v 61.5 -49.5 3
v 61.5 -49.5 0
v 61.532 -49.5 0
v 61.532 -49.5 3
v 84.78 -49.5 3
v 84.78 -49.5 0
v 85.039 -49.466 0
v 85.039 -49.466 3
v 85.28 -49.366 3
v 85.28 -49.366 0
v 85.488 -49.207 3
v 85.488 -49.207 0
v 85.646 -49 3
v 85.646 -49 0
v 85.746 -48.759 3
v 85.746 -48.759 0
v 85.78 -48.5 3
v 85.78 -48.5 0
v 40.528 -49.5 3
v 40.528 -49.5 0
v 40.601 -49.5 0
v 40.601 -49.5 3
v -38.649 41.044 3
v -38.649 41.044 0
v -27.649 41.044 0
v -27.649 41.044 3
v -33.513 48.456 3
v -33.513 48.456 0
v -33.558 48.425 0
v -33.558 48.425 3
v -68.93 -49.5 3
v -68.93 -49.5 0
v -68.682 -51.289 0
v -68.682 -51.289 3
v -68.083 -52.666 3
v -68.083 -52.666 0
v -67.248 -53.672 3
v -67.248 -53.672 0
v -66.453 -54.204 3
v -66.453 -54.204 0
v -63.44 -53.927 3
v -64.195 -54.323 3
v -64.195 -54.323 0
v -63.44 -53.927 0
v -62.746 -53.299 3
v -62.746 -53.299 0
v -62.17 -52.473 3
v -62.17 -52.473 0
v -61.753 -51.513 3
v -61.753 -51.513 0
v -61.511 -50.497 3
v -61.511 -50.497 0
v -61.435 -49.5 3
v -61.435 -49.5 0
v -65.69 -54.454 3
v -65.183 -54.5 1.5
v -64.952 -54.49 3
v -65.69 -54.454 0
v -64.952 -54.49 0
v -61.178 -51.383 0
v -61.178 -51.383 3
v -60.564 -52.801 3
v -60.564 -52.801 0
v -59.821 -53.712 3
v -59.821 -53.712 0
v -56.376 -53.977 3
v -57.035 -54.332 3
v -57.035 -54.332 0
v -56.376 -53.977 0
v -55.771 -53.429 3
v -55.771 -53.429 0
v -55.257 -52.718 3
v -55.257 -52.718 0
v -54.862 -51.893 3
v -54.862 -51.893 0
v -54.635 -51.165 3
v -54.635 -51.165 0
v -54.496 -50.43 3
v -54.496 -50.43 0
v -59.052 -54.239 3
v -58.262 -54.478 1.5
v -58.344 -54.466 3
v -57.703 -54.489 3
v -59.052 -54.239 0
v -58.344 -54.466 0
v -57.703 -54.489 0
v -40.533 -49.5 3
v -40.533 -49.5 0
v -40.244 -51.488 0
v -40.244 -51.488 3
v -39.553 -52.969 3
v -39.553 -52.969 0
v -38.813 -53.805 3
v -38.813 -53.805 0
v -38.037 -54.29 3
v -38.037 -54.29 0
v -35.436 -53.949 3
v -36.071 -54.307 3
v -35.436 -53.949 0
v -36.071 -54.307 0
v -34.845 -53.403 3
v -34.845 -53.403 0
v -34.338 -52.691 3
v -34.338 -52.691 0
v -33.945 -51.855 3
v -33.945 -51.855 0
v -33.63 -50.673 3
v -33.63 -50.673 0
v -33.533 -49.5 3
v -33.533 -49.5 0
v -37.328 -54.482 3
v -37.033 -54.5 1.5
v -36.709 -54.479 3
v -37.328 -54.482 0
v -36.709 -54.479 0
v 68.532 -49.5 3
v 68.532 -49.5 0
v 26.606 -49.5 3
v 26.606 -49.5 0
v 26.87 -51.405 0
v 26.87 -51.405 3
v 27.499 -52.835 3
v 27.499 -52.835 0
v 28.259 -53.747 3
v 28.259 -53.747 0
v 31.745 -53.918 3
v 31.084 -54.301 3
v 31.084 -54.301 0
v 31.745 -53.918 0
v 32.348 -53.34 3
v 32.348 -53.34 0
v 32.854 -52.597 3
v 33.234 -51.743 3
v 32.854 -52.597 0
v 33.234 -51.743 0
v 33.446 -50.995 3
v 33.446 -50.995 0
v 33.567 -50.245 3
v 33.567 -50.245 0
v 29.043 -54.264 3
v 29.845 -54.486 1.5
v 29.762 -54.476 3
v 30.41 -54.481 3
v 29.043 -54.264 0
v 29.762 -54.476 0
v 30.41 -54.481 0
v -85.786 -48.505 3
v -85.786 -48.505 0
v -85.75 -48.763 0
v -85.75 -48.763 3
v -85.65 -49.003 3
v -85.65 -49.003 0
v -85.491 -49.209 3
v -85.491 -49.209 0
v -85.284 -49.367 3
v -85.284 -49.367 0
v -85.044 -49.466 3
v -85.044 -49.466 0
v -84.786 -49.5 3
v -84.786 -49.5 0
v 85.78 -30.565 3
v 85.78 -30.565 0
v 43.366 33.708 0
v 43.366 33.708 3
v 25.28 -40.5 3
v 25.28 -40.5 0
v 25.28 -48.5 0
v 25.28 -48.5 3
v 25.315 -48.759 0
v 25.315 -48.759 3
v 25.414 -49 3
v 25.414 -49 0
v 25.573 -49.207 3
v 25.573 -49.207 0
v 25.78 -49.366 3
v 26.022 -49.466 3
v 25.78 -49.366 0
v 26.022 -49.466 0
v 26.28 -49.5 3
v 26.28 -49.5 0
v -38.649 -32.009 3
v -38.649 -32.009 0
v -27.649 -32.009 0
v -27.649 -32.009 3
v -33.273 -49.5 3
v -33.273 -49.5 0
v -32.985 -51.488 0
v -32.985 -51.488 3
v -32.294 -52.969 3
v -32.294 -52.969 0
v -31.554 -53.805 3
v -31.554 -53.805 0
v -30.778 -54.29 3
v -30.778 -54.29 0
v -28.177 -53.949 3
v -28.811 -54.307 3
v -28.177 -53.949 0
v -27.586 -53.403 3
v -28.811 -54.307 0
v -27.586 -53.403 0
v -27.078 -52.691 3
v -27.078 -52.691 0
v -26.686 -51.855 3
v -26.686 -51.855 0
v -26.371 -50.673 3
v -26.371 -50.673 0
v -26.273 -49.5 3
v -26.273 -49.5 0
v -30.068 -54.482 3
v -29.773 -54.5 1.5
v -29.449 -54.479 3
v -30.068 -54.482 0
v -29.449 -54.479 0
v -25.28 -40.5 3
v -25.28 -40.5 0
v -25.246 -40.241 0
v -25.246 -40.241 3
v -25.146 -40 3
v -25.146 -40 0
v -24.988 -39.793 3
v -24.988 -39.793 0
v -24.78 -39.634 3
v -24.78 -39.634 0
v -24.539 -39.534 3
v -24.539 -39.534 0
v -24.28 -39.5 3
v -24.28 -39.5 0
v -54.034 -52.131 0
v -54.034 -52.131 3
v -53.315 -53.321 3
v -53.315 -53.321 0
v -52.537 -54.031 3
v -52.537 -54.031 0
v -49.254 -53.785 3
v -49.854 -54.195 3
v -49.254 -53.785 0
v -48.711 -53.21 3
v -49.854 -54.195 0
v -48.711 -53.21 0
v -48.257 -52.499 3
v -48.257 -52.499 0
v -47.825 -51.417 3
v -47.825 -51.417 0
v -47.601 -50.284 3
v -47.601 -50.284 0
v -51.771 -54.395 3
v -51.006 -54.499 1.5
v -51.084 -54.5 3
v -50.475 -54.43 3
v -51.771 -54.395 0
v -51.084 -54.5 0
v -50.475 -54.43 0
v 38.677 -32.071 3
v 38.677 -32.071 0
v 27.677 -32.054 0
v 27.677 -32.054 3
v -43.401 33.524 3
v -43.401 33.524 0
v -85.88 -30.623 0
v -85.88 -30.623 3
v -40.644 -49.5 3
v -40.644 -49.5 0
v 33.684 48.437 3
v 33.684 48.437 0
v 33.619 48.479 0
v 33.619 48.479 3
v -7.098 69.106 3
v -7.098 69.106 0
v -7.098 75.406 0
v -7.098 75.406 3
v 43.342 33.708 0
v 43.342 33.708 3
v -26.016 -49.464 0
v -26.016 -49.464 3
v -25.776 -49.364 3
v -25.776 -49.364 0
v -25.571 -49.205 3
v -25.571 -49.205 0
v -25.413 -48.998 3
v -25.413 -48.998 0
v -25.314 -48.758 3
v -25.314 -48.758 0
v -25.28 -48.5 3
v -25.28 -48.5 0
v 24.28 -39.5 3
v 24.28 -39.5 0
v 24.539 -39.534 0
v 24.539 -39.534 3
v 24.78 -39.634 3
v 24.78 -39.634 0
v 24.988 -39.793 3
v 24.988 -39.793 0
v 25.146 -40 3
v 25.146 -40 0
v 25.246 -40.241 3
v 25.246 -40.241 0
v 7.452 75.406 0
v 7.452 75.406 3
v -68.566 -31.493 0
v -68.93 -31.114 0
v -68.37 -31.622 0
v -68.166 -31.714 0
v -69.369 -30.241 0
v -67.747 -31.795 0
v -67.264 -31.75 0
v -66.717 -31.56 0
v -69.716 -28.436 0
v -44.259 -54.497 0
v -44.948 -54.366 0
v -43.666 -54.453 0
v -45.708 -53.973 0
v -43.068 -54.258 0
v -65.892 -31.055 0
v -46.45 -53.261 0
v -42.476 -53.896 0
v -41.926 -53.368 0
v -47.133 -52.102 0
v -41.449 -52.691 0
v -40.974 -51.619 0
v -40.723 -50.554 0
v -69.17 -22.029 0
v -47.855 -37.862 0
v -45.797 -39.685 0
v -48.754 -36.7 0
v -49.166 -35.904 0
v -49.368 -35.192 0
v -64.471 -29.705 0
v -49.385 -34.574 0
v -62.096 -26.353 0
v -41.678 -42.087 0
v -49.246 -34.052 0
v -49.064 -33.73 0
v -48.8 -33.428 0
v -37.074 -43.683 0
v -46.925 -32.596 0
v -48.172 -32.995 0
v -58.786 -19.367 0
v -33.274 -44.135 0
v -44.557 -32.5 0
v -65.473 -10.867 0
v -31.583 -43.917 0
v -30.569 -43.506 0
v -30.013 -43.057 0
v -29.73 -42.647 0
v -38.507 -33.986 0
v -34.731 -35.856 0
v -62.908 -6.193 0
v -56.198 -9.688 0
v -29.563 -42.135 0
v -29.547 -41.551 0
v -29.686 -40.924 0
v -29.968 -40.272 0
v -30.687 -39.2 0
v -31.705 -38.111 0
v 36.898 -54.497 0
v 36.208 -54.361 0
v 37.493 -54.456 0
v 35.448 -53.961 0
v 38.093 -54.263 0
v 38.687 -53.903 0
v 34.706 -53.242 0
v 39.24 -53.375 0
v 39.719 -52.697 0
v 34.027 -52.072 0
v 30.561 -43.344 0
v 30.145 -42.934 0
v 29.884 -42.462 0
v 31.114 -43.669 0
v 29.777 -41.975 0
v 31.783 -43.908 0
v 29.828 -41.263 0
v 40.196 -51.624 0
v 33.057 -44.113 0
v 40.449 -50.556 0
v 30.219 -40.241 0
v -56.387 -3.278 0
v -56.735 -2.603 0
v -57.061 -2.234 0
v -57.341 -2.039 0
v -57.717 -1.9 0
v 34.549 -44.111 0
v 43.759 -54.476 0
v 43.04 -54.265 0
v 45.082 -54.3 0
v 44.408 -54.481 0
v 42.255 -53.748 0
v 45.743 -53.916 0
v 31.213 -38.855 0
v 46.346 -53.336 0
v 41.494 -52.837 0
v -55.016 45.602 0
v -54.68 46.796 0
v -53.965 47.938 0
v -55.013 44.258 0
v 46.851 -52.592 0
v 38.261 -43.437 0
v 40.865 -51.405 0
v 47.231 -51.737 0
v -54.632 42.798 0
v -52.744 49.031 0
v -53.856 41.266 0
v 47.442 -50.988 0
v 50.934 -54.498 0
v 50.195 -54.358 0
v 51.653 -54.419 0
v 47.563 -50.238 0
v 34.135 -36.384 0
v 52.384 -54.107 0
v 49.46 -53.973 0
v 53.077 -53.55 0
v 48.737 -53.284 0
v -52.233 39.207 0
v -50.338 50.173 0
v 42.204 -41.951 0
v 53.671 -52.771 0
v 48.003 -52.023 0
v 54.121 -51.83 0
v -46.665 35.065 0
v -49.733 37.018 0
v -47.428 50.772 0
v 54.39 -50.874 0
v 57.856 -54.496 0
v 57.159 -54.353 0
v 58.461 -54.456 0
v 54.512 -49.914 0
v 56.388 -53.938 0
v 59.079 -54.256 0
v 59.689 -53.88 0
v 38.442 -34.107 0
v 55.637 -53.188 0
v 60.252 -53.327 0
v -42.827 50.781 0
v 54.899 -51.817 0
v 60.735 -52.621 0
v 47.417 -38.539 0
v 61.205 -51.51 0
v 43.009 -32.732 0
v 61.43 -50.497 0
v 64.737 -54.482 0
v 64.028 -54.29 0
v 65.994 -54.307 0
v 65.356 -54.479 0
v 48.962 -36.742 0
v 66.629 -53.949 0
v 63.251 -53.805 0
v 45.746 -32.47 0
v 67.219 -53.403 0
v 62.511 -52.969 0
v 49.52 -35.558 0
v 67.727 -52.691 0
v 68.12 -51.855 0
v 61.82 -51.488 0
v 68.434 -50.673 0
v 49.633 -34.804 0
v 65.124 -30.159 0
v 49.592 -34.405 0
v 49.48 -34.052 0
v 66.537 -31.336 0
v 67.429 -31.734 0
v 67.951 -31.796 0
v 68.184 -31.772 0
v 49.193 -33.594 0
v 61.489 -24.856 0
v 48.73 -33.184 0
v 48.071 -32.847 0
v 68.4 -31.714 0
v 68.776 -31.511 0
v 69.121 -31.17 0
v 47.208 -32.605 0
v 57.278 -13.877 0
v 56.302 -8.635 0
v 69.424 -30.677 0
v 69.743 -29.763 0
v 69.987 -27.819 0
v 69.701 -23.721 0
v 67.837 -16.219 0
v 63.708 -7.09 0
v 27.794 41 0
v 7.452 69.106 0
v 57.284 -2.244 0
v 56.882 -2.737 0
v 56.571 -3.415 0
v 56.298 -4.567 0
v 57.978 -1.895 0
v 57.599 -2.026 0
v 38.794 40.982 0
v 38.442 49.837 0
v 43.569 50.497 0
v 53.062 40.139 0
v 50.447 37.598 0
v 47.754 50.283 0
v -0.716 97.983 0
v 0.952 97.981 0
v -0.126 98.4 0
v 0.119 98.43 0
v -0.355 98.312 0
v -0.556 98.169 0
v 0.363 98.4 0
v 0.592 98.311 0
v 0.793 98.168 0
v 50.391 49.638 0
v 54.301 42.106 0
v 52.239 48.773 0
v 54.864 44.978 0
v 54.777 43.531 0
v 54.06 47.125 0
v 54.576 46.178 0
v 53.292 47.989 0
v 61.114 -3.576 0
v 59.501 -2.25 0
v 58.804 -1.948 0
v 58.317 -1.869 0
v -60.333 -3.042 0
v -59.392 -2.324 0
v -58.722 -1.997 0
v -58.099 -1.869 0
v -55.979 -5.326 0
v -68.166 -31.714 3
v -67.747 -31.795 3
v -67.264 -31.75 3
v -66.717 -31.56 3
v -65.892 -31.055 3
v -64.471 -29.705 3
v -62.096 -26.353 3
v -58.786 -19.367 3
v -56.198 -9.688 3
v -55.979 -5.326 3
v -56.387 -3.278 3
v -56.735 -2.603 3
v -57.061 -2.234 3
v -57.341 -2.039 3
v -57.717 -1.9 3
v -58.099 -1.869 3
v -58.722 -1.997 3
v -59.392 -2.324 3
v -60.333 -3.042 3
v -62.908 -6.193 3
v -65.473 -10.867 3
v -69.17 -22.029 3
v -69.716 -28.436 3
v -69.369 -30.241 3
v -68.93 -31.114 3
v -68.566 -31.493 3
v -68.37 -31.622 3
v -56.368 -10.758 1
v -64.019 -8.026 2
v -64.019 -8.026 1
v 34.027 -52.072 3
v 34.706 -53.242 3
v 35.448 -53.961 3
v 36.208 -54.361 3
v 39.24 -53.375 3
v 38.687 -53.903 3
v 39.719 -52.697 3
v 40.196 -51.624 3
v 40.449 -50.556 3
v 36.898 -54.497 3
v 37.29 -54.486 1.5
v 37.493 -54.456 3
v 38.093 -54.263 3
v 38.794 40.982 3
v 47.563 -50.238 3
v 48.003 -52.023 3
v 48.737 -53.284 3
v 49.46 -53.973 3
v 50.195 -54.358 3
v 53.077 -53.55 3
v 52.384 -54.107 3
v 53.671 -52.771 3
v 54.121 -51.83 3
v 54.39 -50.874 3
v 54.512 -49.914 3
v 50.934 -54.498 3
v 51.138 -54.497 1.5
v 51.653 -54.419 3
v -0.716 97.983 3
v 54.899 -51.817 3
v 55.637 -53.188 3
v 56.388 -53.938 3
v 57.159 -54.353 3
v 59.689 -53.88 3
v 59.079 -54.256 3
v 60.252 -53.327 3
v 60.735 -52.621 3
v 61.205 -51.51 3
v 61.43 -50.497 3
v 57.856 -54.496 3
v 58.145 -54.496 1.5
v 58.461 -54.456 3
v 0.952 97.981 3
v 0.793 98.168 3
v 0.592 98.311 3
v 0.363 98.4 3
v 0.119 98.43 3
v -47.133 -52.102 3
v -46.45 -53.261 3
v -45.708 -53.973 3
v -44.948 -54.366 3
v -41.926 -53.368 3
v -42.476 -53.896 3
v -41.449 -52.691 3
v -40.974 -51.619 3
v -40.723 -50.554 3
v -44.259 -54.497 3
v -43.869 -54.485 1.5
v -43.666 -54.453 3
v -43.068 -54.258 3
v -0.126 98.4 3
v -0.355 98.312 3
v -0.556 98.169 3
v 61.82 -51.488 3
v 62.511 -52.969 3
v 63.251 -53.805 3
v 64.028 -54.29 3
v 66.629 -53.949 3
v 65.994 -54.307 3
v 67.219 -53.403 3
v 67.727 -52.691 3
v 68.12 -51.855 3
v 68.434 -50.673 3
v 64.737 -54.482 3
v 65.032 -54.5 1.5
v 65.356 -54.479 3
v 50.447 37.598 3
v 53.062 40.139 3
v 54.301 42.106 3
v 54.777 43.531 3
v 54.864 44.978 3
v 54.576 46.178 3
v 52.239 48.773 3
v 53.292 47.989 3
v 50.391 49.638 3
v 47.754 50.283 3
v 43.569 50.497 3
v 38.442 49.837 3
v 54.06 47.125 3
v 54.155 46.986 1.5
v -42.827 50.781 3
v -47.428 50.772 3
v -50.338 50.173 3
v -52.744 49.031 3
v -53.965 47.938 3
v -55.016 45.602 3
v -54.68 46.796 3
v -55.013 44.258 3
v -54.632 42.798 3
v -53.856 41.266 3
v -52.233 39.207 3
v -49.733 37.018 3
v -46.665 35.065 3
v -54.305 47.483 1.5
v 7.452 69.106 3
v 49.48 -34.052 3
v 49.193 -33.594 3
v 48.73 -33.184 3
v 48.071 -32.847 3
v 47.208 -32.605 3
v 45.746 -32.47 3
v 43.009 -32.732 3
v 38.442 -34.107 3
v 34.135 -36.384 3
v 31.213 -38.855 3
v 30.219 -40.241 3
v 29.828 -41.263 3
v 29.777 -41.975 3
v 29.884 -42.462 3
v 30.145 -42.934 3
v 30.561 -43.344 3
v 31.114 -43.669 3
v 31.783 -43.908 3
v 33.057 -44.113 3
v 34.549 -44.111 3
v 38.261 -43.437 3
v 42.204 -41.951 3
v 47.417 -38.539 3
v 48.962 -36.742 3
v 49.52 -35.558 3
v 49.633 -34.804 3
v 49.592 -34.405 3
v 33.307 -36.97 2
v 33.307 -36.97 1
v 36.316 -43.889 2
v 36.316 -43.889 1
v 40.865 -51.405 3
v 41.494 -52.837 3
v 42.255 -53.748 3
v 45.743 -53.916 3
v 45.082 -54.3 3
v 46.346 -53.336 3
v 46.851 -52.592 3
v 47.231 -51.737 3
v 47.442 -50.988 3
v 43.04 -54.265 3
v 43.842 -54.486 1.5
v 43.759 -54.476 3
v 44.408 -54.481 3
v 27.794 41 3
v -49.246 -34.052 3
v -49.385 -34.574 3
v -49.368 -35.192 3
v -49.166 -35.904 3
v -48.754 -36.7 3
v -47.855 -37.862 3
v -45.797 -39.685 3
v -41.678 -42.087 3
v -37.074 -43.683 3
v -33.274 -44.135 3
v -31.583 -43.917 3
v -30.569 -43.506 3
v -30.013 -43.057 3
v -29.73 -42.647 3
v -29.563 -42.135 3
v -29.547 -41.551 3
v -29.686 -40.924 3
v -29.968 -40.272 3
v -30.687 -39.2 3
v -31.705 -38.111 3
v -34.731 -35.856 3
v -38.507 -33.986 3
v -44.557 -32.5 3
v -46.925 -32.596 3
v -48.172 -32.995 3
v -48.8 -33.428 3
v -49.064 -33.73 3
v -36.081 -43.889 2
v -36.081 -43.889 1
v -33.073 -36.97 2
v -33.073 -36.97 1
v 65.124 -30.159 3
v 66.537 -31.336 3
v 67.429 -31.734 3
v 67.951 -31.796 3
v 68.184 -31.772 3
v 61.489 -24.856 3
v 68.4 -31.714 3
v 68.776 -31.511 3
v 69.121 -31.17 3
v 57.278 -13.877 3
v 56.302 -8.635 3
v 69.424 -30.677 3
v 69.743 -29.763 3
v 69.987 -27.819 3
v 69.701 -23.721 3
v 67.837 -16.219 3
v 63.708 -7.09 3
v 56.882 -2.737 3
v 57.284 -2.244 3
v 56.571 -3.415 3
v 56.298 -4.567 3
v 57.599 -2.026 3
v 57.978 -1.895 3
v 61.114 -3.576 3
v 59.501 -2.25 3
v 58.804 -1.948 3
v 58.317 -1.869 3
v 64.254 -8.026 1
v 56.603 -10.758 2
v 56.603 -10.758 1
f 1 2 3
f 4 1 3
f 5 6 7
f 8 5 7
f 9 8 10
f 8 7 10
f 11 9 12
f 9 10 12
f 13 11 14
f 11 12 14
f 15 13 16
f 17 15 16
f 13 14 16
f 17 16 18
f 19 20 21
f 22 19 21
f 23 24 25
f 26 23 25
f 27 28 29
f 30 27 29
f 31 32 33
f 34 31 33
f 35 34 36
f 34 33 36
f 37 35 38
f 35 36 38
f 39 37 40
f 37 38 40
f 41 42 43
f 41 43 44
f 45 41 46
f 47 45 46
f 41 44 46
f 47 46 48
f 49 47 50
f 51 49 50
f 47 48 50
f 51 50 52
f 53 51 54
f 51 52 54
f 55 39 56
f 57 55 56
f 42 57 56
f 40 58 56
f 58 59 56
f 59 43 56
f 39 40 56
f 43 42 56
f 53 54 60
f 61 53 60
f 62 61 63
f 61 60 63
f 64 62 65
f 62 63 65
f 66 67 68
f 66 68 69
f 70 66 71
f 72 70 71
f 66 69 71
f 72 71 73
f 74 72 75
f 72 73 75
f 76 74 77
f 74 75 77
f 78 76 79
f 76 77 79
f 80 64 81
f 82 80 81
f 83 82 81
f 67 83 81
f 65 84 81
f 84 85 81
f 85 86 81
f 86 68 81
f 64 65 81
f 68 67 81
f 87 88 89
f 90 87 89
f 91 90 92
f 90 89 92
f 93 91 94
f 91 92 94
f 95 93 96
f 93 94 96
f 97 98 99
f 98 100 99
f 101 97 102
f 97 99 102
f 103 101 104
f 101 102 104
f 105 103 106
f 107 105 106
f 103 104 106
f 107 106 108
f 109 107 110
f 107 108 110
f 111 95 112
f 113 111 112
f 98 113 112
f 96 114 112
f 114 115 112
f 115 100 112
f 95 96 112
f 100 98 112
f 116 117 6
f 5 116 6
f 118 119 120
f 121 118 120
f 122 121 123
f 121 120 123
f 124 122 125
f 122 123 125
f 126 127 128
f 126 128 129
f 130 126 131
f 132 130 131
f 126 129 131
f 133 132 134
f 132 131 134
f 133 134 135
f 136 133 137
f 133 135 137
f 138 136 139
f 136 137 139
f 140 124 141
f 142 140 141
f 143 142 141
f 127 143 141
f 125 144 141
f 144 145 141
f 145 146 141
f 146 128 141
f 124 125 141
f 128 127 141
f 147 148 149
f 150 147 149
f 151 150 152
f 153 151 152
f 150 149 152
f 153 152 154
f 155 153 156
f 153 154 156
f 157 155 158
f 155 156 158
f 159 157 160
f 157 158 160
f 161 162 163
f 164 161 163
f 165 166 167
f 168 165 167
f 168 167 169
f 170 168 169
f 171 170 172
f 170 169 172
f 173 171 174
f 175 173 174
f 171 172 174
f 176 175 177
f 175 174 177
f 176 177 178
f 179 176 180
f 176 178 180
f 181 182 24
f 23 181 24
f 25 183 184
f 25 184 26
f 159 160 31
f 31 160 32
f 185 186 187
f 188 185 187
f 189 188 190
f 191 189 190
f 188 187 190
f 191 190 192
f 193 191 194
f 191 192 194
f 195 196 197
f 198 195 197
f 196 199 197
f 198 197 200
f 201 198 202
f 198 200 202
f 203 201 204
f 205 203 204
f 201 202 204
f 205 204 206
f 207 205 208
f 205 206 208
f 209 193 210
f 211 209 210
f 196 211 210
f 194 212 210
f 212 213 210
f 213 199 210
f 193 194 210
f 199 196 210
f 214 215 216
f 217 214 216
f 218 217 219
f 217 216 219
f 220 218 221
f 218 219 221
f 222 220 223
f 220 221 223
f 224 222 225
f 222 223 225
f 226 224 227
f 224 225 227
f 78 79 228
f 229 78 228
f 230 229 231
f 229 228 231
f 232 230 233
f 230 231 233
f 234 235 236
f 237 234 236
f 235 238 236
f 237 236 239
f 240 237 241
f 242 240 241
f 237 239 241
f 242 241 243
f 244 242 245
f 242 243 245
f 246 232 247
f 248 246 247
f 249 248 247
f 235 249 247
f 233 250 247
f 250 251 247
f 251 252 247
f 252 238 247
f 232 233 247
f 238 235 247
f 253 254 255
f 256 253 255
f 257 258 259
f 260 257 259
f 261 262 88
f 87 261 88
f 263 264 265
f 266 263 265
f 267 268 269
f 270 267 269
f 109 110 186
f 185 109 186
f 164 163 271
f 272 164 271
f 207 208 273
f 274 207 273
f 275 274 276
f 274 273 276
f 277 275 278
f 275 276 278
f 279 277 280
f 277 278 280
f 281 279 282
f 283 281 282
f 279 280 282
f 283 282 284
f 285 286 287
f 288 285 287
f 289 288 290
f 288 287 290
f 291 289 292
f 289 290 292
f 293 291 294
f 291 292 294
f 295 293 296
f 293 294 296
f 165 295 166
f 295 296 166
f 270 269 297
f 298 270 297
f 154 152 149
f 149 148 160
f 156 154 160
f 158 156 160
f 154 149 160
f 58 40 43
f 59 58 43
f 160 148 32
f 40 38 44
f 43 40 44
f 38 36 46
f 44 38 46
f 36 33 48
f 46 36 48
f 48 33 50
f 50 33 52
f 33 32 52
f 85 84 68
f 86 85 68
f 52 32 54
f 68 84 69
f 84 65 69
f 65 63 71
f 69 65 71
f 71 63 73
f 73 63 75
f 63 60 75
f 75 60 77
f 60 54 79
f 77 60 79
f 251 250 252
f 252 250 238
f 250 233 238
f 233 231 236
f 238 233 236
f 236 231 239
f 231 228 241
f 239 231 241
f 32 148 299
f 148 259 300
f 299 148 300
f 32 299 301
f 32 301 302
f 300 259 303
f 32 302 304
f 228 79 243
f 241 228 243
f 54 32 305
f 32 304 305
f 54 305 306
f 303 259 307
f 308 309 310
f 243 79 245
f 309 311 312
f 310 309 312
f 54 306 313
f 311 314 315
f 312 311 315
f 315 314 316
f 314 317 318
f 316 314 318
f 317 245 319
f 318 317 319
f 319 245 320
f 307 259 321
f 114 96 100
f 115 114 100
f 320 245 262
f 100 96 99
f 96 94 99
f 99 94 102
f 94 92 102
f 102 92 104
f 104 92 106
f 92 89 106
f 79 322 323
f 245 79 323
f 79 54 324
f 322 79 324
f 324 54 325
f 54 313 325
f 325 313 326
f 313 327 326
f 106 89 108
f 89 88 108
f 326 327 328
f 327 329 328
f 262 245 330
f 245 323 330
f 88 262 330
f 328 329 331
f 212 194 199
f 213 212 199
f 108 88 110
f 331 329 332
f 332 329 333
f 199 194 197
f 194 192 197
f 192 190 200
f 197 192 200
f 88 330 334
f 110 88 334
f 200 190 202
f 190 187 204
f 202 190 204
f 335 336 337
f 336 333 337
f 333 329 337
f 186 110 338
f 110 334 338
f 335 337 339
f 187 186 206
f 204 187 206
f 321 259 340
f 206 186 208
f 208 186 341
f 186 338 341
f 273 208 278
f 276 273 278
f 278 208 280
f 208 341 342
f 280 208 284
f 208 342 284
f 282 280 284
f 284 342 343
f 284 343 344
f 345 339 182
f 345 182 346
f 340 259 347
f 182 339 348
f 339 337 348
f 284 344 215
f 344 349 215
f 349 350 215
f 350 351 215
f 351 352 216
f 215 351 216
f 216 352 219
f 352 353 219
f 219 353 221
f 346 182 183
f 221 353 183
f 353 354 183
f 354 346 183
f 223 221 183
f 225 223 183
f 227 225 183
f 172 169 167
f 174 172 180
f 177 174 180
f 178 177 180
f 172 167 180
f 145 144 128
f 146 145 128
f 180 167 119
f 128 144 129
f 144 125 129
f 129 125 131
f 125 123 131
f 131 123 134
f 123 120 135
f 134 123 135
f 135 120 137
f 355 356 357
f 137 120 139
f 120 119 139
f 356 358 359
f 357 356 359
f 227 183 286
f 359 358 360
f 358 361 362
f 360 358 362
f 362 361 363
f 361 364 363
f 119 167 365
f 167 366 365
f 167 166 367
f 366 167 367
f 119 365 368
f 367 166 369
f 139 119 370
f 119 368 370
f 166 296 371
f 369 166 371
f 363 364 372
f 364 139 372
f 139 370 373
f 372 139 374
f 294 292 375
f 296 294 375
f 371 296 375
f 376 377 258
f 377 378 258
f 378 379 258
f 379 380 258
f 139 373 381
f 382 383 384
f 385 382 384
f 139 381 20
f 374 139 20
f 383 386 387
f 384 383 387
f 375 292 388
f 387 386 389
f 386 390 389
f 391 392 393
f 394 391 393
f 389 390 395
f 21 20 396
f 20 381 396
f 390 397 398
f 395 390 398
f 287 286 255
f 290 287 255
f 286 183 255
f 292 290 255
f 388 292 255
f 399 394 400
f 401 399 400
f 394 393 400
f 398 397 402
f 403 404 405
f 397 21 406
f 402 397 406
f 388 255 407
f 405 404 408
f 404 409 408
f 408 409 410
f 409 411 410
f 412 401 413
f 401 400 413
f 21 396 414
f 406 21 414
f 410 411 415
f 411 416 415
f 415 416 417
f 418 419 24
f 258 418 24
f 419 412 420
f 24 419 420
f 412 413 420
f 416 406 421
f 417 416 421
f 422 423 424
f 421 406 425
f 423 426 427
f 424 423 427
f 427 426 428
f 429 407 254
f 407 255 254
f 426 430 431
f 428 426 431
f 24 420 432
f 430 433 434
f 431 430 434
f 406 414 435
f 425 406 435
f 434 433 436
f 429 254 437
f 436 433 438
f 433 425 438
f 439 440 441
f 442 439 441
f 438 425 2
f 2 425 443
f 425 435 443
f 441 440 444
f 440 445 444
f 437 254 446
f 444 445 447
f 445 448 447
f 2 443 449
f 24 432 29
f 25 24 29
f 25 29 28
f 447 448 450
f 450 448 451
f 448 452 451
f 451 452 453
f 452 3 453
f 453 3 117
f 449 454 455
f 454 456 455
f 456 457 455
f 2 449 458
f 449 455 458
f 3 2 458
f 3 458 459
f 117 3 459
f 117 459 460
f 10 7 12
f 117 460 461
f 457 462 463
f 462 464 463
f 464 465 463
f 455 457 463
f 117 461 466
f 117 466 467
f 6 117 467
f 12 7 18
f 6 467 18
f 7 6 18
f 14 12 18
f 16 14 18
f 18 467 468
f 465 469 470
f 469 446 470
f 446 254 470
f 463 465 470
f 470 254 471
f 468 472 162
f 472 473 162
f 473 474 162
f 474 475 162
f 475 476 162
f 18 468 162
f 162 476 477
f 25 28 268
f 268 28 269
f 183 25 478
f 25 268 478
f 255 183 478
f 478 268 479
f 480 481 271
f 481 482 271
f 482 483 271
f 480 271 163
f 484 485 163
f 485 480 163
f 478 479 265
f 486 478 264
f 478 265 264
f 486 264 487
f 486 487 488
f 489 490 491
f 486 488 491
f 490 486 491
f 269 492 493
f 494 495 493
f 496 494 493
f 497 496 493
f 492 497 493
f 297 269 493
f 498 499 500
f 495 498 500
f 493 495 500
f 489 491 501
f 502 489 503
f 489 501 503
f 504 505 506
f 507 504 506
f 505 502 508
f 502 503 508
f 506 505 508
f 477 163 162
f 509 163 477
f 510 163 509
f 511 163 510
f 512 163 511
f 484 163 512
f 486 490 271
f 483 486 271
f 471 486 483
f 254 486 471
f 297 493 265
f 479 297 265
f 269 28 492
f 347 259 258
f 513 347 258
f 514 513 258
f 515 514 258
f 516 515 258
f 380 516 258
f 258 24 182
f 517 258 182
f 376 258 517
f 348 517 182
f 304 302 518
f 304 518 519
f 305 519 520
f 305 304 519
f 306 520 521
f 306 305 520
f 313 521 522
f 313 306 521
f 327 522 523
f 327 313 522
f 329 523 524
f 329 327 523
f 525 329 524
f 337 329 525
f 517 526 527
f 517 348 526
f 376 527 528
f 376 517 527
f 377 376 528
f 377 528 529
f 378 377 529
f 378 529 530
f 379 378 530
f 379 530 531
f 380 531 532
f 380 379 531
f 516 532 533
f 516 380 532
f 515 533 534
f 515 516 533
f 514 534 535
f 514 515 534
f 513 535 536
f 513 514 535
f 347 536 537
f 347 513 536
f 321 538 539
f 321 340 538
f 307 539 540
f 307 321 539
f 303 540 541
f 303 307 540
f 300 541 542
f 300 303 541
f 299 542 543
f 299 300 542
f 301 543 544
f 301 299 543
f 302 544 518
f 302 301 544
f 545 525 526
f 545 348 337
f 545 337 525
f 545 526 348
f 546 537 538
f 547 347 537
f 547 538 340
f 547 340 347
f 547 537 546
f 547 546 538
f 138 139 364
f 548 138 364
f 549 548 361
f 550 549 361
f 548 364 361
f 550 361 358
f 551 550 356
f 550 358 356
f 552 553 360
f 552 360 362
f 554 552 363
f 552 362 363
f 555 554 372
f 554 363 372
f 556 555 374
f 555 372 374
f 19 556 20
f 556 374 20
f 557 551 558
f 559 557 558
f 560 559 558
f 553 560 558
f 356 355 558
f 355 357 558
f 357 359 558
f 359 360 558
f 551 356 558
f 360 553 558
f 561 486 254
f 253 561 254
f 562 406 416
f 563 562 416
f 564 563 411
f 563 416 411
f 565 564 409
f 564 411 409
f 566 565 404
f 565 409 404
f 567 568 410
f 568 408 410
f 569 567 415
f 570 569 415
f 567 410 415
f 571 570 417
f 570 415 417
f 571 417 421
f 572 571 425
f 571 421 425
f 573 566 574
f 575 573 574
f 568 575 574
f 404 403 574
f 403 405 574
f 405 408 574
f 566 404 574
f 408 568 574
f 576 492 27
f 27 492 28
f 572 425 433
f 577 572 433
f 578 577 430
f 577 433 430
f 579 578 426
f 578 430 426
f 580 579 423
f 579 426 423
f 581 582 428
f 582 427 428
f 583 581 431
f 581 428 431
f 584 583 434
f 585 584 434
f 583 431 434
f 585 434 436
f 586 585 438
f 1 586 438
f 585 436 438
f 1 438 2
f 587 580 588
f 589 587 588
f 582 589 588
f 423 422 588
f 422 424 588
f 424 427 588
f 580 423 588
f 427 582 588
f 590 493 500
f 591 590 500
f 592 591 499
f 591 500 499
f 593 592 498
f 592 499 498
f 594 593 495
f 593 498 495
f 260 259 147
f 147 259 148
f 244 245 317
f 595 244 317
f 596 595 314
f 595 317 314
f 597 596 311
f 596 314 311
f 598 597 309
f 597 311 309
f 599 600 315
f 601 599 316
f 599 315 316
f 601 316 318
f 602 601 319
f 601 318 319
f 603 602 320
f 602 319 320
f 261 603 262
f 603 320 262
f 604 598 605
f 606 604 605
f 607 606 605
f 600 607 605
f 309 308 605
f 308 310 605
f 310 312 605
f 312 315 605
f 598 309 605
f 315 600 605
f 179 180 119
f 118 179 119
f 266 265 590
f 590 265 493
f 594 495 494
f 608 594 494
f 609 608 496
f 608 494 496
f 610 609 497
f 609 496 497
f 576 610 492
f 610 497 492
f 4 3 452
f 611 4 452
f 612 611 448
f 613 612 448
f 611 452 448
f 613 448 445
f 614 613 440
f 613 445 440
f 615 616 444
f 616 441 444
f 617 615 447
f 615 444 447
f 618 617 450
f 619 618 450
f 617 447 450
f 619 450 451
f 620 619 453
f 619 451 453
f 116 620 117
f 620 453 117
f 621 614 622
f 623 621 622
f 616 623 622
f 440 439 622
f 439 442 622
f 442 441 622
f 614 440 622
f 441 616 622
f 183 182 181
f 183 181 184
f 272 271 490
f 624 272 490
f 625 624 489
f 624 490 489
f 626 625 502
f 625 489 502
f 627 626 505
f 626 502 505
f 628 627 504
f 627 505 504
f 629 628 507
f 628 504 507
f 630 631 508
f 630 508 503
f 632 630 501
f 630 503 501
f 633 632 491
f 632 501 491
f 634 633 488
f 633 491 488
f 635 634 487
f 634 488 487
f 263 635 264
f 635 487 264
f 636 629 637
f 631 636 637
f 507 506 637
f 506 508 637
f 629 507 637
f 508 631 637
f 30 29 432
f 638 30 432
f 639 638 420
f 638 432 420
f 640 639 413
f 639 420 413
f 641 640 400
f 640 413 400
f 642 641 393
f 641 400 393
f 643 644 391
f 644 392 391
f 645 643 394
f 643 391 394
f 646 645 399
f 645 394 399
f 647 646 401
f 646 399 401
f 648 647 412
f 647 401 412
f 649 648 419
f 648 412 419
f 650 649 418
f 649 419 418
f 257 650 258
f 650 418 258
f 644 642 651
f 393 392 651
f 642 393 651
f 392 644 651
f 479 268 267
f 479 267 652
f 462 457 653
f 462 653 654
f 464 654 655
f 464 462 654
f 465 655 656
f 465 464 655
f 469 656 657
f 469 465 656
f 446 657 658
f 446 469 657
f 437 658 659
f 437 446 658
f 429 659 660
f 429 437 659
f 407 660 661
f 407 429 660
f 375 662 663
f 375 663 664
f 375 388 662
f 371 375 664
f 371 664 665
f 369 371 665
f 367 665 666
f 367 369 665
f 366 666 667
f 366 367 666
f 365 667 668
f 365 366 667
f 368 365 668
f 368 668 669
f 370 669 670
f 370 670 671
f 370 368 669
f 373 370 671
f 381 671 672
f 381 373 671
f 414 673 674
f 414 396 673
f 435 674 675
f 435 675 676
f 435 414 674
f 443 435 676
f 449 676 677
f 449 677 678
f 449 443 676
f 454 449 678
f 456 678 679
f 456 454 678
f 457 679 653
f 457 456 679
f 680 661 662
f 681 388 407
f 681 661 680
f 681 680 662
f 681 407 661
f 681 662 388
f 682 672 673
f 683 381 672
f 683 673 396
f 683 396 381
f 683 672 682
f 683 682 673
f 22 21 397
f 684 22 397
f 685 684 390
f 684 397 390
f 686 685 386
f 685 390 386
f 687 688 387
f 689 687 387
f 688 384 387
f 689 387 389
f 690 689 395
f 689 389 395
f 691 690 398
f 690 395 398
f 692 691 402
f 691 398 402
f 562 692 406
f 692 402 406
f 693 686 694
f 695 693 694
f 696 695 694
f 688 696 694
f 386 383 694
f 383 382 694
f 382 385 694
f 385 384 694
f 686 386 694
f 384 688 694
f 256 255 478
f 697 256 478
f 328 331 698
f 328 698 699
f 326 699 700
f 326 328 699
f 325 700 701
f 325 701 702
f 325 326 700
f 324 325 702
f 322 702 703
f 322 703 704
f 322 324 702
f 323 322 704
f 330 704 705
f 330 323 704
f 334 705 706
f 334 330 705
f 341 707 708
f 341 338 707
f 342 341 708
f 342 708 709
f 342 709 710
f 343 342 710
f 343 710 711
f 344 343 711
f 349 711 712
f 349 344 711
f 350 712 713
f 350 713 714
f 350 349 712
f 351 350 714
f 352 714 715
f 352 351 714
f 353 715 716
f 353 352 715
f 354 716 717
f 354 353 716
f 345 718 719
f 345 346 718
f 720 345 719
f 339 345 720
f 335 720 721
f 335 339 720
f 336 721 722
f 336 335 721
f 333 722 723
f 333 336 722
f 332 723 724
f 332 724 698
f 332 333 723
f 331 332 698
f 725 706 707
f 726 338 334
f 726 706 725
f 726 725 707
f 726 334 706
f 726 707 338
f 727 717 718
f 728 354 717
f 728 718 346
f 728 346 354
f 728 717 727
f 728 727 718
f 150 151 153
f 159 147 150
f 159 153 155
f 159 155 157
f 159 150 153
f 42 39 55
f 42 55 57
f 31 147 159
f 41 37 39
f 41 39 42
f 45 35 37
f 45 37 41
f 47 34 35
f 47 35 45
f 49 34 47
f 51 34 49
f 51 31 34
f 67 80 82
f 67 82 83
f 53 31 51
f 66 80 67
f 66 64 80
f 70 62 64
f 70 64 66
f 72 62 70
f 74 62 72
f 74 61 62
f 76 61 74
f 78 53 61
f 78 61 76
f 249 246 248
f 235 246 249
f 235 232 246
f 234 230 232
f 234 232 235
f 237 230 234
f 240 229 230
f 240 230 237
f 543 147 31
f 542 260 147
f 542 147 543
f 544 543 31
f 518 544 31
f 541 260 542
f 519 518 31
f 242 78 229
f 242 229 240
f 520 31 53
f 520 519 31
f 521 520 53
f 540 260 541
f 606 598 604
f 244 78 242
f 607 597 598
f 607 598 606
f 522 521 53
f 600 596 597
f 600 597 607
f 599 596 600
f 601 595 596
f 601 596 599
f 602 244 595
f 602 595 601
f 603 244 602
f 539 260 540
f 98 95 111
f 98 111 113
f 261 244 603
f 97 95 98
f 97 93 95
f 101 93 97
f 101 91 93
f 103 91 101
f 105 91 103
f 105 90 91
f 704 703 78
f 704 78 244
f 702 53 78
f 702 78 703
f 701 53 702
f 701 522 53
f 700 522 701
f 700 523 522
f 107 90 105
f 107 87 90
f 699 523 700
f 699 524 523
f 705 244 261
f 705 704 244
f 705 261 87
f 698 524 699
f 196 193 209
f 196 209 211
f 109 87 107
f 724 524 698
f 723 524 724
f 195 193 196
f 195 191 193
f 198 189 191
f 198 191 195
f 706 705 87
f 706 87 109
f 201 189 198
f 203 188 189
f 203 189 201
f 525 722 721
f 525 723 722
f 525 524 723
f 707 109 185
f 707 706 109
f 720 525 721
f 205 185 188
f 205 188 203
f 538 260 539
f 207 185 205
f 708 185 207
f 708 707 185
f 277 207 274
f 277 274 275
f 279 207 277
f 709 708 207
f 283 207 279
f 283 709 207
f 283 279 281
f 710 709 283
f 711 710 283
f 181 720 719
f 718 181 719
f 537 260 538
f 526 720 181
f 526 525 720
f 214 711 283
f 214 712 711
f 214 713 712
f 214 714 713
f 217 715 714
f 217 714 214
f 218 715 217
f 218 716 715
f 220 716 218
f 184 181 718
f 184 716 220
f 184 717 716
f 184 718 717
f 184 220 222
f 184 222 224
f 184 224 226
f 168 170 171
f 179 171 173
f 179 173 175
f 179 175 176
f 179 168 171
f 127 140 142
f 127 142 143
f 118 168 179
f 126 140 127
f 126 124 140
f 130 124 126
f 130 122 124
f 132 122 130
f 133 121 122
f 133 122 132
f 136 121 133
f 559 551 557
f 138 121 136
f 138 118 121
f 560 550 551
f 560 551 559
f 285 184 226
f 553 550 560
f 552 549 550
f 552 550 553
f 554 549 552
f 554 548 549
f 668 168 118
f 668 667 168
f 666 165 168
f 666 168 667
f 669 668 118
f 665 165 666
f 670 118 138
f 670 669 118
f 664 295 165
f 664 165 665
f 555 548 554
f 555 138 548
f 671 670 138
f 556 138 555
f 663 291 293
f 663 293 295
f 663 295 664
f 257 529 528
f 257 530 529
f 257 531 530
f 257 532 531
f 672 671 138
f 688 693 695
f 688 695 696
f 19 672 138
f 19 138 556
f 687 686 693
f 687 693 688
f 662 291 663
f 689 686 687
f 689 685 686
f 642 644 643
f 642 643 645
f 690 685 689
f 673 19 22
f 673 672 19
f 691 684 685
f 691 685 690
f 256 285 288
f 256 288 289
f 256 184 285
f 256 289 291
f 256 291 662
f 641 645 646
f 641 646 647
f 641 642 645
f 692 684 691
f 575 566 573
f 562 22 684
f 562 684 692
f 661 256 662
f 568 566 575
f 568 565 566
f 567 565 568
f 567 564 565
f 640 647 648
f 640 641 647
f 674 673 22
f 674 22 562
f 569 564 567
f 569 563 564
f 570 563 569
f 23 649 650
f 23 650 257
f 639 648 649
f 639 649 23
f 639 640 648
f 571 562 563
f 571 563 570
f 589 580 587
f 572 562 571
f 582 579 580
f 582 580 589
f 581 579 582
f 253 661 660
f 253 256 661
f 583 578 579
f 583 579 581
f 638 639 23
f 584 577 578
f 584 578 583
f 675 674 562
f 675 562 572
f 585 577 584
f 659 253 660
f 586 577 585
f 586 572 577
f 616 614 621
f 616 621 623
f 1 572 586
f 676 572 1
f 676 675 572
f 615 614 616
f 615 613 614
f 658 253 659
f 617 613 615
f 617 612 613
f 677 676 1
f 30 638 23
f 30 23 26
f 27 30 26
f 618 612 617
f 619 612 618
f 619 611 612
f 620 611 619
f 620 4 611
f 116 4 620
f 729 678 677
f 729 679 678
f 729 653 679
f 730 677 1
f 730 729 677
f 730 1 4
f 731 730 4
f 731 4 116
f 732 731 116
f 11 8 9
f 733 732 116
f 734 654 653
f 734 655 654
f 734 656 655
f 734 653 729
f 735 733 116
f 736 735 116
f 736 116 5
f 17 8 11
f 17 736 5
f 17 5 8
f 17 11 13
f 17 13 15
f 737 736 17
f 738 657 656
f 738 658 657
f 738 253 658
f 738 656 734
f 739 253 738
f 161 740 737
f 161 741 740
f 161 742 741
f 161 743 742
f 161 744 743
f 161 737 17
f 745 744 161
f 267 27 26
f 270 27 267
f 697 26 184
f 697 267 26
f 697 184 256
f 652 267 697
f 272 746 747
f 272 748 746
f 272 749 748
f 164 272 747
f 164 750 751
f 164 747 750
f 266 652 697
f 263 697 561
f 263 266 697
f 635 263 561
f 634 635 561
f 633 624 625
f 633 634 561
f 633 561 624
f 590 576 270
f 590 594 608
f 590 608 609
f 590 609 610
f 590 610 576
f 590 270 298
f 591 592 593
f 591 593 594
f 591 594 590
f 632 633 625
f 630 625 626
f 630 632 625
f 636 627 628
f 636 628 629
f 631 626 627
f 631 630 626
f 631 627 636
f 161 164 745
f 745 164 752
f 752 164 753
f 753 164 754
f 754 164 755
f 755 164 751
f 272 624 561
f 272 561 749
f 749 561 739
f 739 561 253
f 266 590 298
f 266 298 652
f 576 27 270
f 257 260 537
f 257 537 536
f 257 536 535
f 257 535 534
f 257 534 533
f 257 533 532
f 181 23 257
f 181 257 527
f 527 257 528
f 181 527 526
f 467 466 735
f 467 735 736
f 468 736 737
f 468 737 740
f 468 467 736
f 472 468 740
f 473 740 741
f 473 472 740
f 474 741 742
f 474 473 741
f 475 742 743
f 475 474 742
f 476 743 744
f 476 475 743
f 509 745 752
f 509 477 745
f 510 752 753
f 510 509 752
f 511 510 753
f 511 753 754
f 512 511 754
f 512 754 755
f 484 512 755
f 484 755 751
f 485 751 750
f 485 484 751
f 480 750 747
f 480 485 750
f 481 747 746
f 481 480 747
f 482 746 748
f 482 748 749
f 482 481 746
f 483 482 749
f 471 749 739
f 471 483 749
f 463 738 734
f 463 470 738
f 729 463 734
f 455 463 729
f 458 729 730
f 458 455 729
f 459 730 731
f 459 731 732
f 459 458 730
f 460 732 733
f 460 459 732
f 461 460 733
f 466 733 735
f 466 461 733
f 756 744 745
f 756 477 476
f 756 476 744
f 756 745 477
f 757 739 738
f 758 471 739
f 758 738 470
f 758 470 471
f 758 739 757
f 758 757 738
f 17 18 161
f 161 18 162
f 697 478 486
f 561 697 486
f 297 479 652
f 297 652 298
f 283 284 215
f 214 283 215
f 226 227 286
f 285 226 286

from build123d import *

# Parameters (mm, degrees)
F0_W     = 11
F0_H     = 73.0535946786
F0_W_2   = 14.55
F0_H_2   = 6.3
F1_DEPTH = 3


with BuildPart() as f1:
    # F0 (on Top) → F1 (new body)
    with BuildSketch(Plane.XY):
        with BuildLine():
            ThreePointArc((-85.7856848061, -48.505251108), (-85.4909475911, -49.2089631354), (-84.7856985751, -49.5000034571))
            Line((-84.7856985751, -49.5000034571), (-68.9299244289, -49.5000034571))
            Line((-68.9299244289, -49.5000034571), (-61.4353581368, -49.5000034571))
            Line((-61.4353581368, -49.5000034571), (-54.4939316693, -49.5000034571))
            Line((-54.4939316693, -49.5000034571), (-54.4964335859, -50.4300000917))
            add(Edge.make_bspline(
                [(-54.4964335859, -50.4300000917), (-53.9489045305, -54.5619244379), (-51.0055141238, -54.4994516979), (-48.062123717, -54.4369789579), (-47.6007624642, -50.2836411622)],
                knots=[4.89947782, 4.89947782, 4.89947782, 6.2980415426, 6.2980415426, 7.6966052651, 7.6966052651, 7.6966052651], degree=2, weights=[1, 0.7653046277, 1, 0.7653046277, 1]))
            Line((-47.6007624642, -50.2836411622), (-47.6007624642, -49.5000034571))
            Line((-47.6007624642, -49.5000034571), (-40.6440158935, -49.5000034571))
            Line((-40.6440158935, -49.5000034571), (-40.5326788576, -49.5000034571))
            Line((-40.5326788576, -49.5000034571), (-33.5326788576, -49.5000034571))
            Line((-33.5326788576, -49.5000034571), (-33.2731907519, -49.5000034571))
            Line((-33.2731907519, -49.5000034571), (-26.2804646211, -49.5000034571))
            ThreePointArc((-26.2804646211, -49.5000034571), (-26.2768276625, -49.4999968433), (-26.2731907519, -49.4999770021))
            ThreePointArc((-26.2731907519, -49.4999770021), (-25.5707907984, -49.2045338435), (-25.2804646211, -48.5000034571))
            Line((-25.2804646211, -48.5000034571), (-25.2804646211, -40.5000034571))
            ThreePointArc((-25.2804646211, -40.5000034571), (-24.9875714023, -39.7928966759), (-24.2804646211, -39.5000034571))
            Line((-24.2804646211, -39.5000034571), (0.0080129938, -39.5000034571))
            Line((0.0080129938, -39.5000034571), (24.2804646211, -39.5000034571))
            ThreePointArc((24.2804646211, -39.5000034571), (24.9875714023, -39.7928966759), (25.2804646211, -40.5000034571))
            Line((25.2804646211, -40.5000034571), (25.2804646211, -48.5000034571))
            ThreePointArc((25.2804646211, -48.5000034571), (25.5733578399, -49.2071102383), (26.2804646211, -49.5000034571))
            Line((26.2804646211, -49.5000034571), (26.6061850041, -49.5000034571))
            Line((26.6061850041, -49.5000034571), (33.6094798, -49.5000034571))
            Line((33.6094798, -49.5000034571), (40.528003484, -49.5000034571))
            Line((40.528003484, -49.5000034571), (40.6009402275, -49.5000034571))
            Line((40.6009402275, -49.5000034571), (47.6053172203, -49.5000034571))
            Line((47.6053172203, -49.5000034571), (54.5243214667, -49.5000034571))
            Line((54.5243214667, -49.5000034571), (61.5002851784, -49.5000034571))
            Line((61.5002851784, -49.5000034571), (61.5318711996, -49.5000034571))
            Line((61.5318711996, -49.5000034571), (68.5318711996, -49.5000034571))
            Line((68.5318711996, -49.5000034571), (84.7804646211, -49.5000034571))
            ThreePointArc((84.7804646211, -49.5000034571), (85.4875714023, -49.2071102383), (85.7804646211, -48.5000034571))
            Line((85.7804646211, -48.5000034571), (85.7804646211, -30.5649356997))
            Line((85.7804646211, -30.5649356997), (43.3664230703, 33.708122717))
            Line((43.3664230703, 33.708122717), (43.3420082833, 33.7081147164))
            add(Edge.make_bspline(
                [(43.3420082833, 33.7081147164), (58.9825854354, 39.6237113716), (54.1552384869, 46.9855440531), (49.3278915384, 54.3473767347), (33.6841810231, 48.4365585419)],
                knots=[1.7243334024, 1.7243334024, 1.7243334024, 3.2948051862, 3.2948051862, 4.86527697, 4.86527697, 4.86527697], degree=2, weights=[1, 0.7072215152, 1, 0.7072215152, 1]))
            Line((33.6841810231, 48.4365585419), (33.619058901, 48.4790071635))
            Line((33.619058901, 48.4790071635), (0.9523815194, 97.9811811337))
            ThreePointArc((0.9523815194, 97.9811811337), (0.5920150312, 98.3107689704), (0.1185365363, 98.4303944806))
            ThreePointArc((0.1185365363, 98.4303944806), (-0.3551330622, 98.3115279195), (-0.7160272843, 97.9825180286))
            Line((-0.7160272843, 97.9825180286), (-33.5126452304, 48.4562718246))
            Line((-33.5126452304, 48.4562718246), (-33.558400511, 48.4254359328))
            add(Edge.make_bspline(
                [(-33.558400511, 48.4254359328), (-49.3295986778, 55.0156726288), (-54.304702772, 47.4834180097), (-59.2798068663, 39.9511633907), (-43.4009940183, 33.5238541763)],
                knots=[1.422954115, 1.422954115, 1.422954115, 3.0045659723, 3.0045659723, 4.5861778295, 4.5861778295, 4.5861778295], degree=2, weights=[1, 0.7032725931, 1, 0.7032725931, 1]))
            Line((-43.4009940183, 33.5238541763), (-85.8795255346, -30.6230713915))
            Line((-85.8795255346, -30.6230713915), (-85.7856848061, -48.505251108))
        make_face()
        with BuildLine():
            add(Edge.make_bspline(
                [(-68.1659526923, -31.7135490477), (-60.5147940439, -34.4461020139), (-56.3683340858, -10.7580853655), (-52.2218741276, 12.929931283), (-64.0194927341, -8.0255323992), (-75.8171113406, -28.9809960815), (-68.1659526923, -31.7135490477)],
                knots=[0, 0, 0, 2.0943951024, 2.0943951024, 4.1887902048, 4.1887902048, 6.2831853072, 6.2831853072, 6.2831853072], degree=2, weights=[1, 0.5, 1, 0.5, 1, 0.5, 1]))
        make_face(mode=Mode.SUBTRACT)
        with BuildLine():
            add(Edge.make_bspline(
                [(-49.2456242242, -34.0520180762), (-52.2540837889, -40.9714753387), (-36.0812831751, -43.8893859564), (-19.9084825613, -46.8072965741), (-33.0728236104, -36.9699286939), (-46.2371646594, -27.1325608136), (-49.2456242242, -34.0520180762)],
                knots=[0, 0, 0, 2.0943951024, 2.0943951024, 4.1887902048, 4.1887902048, 6.2831853072, 6.2831853072, 6.2831853072], degree=2, weights=[1, 0.5, 1, 0.5, 1, 0.5, 1]))
        make_face(mode=Mode.SUBTRACT)
        with Locations((-33.1490184932, 4.5174889822)):
            Rectangle(F0_W, F0_H, mode=Mode.SUBTRACT)
        with BuildLine():
            add(Edge.make_bspline(
                [(49.4799129665, -34.0520180762), (46.4714534017, -27.1325608136), (33.3071123527, -36.9699286939), (20.1427713037, -46.8072965741), (36.3155719175, -43.8893859564), (52.4883725313, -40.9714753387), (49.4799129665, -34.0520180762)],
                knots=[0, 0, 0, 2.0943951024, 2.0943951024, 4.1887902048, 4.1887902048, 6.2831853072, 6.2831853072, 6.2831853072], degree=2, weights=[1, 0.5, 1, 0.5, 1, 0.5, 1]))
        make_face(mode=Mode.SUBTRACT)
        with BuildLine():
            add(Edge.make_bspline(
                [(68.4002414346, -31.7135490477), (76.0514000829, -28.9809960815), (64.2537814764, -8.0255323992), (52.4561628699, 12.929931283), (56.6026228281, -10.7580853655), (60.7490827862, -34.4461020139), (68.4002414346, -31.7135490477)],
                knots=[0, 0, 0, 2.0943951024, 2.0943951024, 4.1887902048, 4.1887902048, 6.2831853072, 6.2831853072, 6.2831853072], degree=2, weights=[1, 0.5, 1, 0.5, 1, 0.5, 1]))
        make_face(mode=Mode.SUBTRACT)
        Polygon((27.7940890609, 40.9998597937), (38.7940749351, 40.9822312187), (38.6769994099, -32.0712696474), (27.6770135357, -32.0536410724), align=None, mode=Mode.SUBTRACT)
        with Locations((0.1765319429, 72.2562882543)):
            Rectangle(F0_W_2, F0_H_2, mode=Mode.SUBTRACT)
        with BuildLine():
            Line((-61.4353581368, -49.5000034571), (-68.9299244289, -49.5000034571))
            add(Edge.make_bspline(
                [(-68.9299244289, -49.5000034571), (-68.9299244289, -54.5000034571), (-65.1826412829, -54.5000034571), (-61.4353581368, -54.5000034571), (-61.4353581368, -49.5000034571)],
                knots=[4.7123889804, 4.7123889804, 4.7123889804, 6.2831853072, 6.2831853072, 7.853981634, 7.853981634, 7.853981634], degree=2, weights=[1, 0.7071067812, 1, 0.7071067812, 1]))
        make_face()
        with BuildLine():
            Line((-54.4939316693, -49.5000034571), (-61.4353581368, -49.5000034571))
            add(Edge.make_bspline(
                [(-61.4353581368, -49.5000034571), (-61.4353581368, -54.0528687331), (-58.2622863183, -54.4781430088), (-55.0892144997, -54.9034172845), (-54.4964335859, -50.4300000917)],
                knots=[4.7123889804, 4.7123889804, 4.7123889804, 6.1896408874, 6.1896408874, 7.6668927943, 7.6668927943, 7.6668927943], degree=2, weights=[1, 0.7393943643, 1, 0.7393943643, 1]))
            Line((-54.4964335859, -50.4300000917), (-54.4939316693, -49.5000034571))
        make_face()
        with BuildLine():
            Line((-33.5326788576, -49.5000034571), (-40.5326788576, -49.5000034571))
            add(Edge.make_bspline(
                [(-40.5326788576, -49.5000034571), (-40.5326788576, -54.5000034571), (-37.0326788576, -54.5000034571), (-33.5326788576, -54.5000034571), (-33.5326788576, -49.5000034571)],
                knots=[4.7123889804, 4.7123889804, 4.7123889804, 6.2831853072, 6.2831853072, 7.853981634, 7.853981634, 7.853981634], degree=2, weights=[1, 0.7071067812, 1, 0.7071067812, 1]))
        make_face()
        with BuildLine():
            Line((-47.6007624642, -49.5000034571), (-47.6007624642, -50.2836411622))
            add(Edge.make_bspline(
                [(-47.6007624642, -50.2836411622), (-47.0937668544, -54.8477956417), (-43.8688913739, -54.4845318667), (-40.6440158935, -54.1212680917), (-40.6440158935, -49.5000034571)],
                knots=[4.8697653493, 4.8697653493, 4.8697653493, 6.3618734916, 6.3618734916, 7.853981634, 7.853981634, 7.853981634], degree=2, weights=[1, 0.7343728636, 1, 0.7343728636, 1]))
            Line((-40.6440158935, -49.5000034571), (-47.6007624642, -49.5000034571))
        make_face()
        with BuildLine():
            Line((-26.2804646211, -49.5000034571), (-33.2731907519, -49.5000034571))
            add(Edge.make_bspline(
                [(-33.2731907519, -49.5000034571), (-33.2731907519, -54.5000166846), (-29.7731814926, -54.5000034571), (-26.2731722334, -54.4999902295), (-26.2731907519, -49.4999770021)],
                knots=[4.7123889804, 4.7123889804, 4.7123889804, 6.2831879527, 6.2831879527, 7.853986925, 7.853986925, 7.853986925], degree=2, weights=[1, 0.7071058459, 1, 0.7071058459, 1]))
            ThreePointArc((-26.2731907519, -49.4999770021), (-26.2768276625, -49.4999968433), (-26.2804646211, -49.5000034571))
        make_face()
        with BuildLine():
            Line((33.6094798, -49.5000034571), (26.6061850041, -49.5000034571))
            add(Edge.make_bspline(
                [(26.6061850041, -49.5000034571), (26.6061850041, -54.1393314863), (29.8446341867, -54.4860229258), (33.0830833693, -54.8327143653), (33.5670942441, -50.24520201)],
                knots=[4.7123889804, 4.7123889804, 4.7123889804, 6.2083867743, 6.2083867743, 7.7043845683, 7.7043845683, 7.7043845683], degree=2, weights=[1, 0.7330514324, 1, 0.7330514324, 1]))
            Line((33.5670942441, -50.24520201), (33.6094798, -49.5000034571))
        make_face()
        with BuildLine():
            Line((54.5123033226, -49.9139998416), (54.5243214667, -49.5000034571))
            Line((54.5243214667, -49.5000034571), (47.6053172203, -49.5000034571))
            Line((47.6053172203, -49.5000034571), (47.5626308471, -50.2377579849))
            add(Edge.make_bspline(
                [(47.5626308471, -50.2377579849), (48.0226120838, -54.6424992613), (51.1383967745, -54.4973470012), (54.2541814653, -54.3521947411), (54.5123033226, -49.9139998416)],
                knots=[4.8604805954, 4.8604805954, 4.8604805954, 6.3157840256, 6.3157840256, 7.7710874559, 7.7710874559, 7.7710874559], degree=2, weights=[1, 0.7467383462, 1, 0.7467383462, 1]))
        make_face()
        with BuildLine():
            Line((47.5626308471, -50.2377579849), (47.6053172203, -49.5000034571))
            Line((47.6053172203, -49.5000034571), (40.6009402275, -49.5000034571))
            add(Edge.make_bspline(
                [(40.6009402275, -49.5000034571), (40.6009402275, -54.1428346415), (43.8420166563, -54.4863027646), (47.0830930851, -54.8297708877), (47.5626308471, -50.2377579849)],
                knots=[4.7123889804, 4.7123889804, 4.7123889804, 6.2091394997, 6.2091394997, 7.705890019, 7.705890019, 7.705890019], degree=2, weights=[1, 0.7327953886, 1, 0.7327953886, 1]))
        make_face()
        with BuildLine():
            Line((40.528003484, -49.5000034571), (33.6094798, -49.5000034571))
            Line((33.6094798, -49.5000034571), (33.5670942441, -50.24520201))
            add(Edge.make_bspline(
                [(33.5670942441, -50.24520201), (34.0511051188, -54.8327143653), (37.2895543014, -54.4860229258), (40.528003484, -54.1393314863), (40.528003484, -49.5000034571)],
                knots=[4.8619860461, 4.8619860461, 4.8619860461, 6.35798384, 6.35798384, 7.853981634, 7.853981634, 7.853981634], degree=2, weights=[1, 0.7330514324, 1, 0.7330514324, 1]))
        make_face()
        with BuildLine():
            add(Edge.make_bspline(
                [(54.5123033226, -49.9139998416), (54.7903317418, -54.6944718456), (58.1453084601, -54.4957094189), (61.5002851784, -54.2969469922), (61.5002851784, -49.5000034571)],
                knots=[4.7952831585, 4.7952831585, 4.7952831585, 6.3246323962, 6.3246323962, 7.853981634, 7.853981634, 7.853981634], degree=2, weights=[1, 0.7216076577, 1, 0.7216076577, 1]))
            Line((61.5002851784, -49.5000034571), (54.5243214667, -49.5000034571))
            Line((54.5243214667, -49.5000034571), (54.5123033226, -49.9139998416))
        make_face()
        with BuildLine():
            add(Edge.make_bspline(
                [(61.5318711996, -49.5000034571), (61.5318711996, -54.5000034571), (65.0318711996, -54.5000034571), (68.5318711996, -54.5000034571), (68.5318711996, -49.5000034571)],
                knots=[4.7123889804, 4.7123889804, 4.7123889804, 6.2831853072, 6.2831853072, 7.853981634, 7.853981634, 7.853981634], degree=2, weights=[1, 0.7071067812, 1, 0.7071067812, 1]))
            Line((68.5318711996, -49.5000034571), (61.5318711996, -49.5000034571))
        make_face()
    extrude(amount=F1_DEPTH)


solid = f1.part
